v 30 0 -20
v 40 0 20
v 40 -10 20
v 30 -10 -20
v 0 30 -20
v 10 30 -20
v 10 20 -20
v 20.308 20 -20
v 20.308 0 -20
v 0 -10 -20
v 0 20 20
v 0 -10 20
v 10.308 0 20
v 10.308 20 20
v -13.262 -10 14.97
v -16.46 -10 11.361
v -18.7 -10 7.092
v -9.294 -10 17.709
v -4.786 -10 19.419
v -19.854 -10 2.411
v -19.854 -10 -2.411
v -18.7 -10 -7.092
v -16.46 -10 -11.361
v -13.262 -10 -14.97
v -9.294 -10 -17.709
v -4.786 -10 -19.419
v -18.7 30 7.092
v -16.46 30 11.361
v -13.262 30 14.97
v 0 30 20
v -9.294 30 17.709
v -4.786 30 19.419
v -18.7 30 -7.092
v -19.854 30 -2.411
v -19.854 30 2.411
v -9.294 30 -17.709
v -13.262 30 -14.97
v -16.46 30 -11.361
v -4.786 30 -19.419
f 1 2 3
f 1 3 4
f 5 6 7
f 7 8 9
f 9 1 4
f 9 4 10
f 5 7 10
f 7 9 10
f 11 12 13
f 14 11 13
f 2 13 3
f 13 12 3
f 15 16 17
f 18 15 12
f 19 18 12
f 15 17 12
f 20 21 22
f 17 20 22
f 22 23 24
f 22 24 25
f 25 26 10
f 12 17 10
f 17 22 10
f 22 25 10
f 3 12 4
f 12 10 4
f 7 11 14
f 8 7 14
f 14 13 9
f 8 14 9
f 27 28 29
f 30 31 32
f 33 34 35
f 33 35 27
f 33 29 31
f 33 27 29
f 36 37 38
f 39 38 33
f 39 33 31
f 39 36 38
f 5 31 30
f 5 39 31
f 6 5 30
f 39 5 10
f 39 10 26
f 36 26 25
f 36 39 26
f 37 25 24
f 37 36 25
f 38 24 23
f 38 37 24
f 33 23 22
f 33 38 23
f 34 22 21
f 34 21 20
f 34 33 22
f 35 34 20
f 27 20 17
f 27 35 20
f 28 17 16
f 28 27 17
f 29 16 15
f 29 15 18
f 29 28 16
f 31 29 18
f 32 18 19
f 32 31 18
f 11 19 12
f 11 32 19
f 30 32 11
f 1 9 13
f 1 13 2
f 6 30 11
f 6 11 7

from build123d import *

# Parameters (mm, degrees)
EXTRUDE_1_DEPTH = 10
EXTRUDE_START   = 30
EXTRUDE_2_DEPTH = 30
EXTRUDE_3_DEPTH = 20


with BuildPart() as part:
    # 草圖1 → 填料-伸長1 (new body)
    with BuildSketch(Plane(origin=(0, 0, 0), x_dir=(1, 0, 0), z_dir=(0, 1, 0))):
        with BuildLine():
            Line((0, -20), (40, -20))
            Line((40, -20), (30, 20))
            Line((30, 20), (0, 20))
            ThreePointArc((0, 20), (-20, 0), (0, -20))
        make_face()
    extrude(amount=-EXTRUDE_1_DEPTH)

    # 草圖2 → 填料-伸長2 (add)
    with BuildSketch(Plane(origin=(0, 0, 0), x_dir=(1, 0, 0), z_dir=(0, 1, 0)).offset(EXTRUDE_START)):
        with BuildLine():
            Line((10, 20), (0, 20))
            ThreePointArc((0, 20), (-20, 0), (0, -20))
            Line((0, -20), (10, 20))
        make_face()
    extrude(amount=-EXTRUDE_2_DEPTH)

    # 草圖2<3> → 填料-伸長3 (add)
    with BuildSketch(Plane(origin=(0, 0, 0), x_dir=(1, 0, 0), z_dir=(0, 1, 0))):
        Polygon((20.307764064, 20), (10, 20), (0, -20), (10.307764064, -20), align=None)
    extrude(amount=EXTRUDE_3_DEPTH)


solid = part.part
